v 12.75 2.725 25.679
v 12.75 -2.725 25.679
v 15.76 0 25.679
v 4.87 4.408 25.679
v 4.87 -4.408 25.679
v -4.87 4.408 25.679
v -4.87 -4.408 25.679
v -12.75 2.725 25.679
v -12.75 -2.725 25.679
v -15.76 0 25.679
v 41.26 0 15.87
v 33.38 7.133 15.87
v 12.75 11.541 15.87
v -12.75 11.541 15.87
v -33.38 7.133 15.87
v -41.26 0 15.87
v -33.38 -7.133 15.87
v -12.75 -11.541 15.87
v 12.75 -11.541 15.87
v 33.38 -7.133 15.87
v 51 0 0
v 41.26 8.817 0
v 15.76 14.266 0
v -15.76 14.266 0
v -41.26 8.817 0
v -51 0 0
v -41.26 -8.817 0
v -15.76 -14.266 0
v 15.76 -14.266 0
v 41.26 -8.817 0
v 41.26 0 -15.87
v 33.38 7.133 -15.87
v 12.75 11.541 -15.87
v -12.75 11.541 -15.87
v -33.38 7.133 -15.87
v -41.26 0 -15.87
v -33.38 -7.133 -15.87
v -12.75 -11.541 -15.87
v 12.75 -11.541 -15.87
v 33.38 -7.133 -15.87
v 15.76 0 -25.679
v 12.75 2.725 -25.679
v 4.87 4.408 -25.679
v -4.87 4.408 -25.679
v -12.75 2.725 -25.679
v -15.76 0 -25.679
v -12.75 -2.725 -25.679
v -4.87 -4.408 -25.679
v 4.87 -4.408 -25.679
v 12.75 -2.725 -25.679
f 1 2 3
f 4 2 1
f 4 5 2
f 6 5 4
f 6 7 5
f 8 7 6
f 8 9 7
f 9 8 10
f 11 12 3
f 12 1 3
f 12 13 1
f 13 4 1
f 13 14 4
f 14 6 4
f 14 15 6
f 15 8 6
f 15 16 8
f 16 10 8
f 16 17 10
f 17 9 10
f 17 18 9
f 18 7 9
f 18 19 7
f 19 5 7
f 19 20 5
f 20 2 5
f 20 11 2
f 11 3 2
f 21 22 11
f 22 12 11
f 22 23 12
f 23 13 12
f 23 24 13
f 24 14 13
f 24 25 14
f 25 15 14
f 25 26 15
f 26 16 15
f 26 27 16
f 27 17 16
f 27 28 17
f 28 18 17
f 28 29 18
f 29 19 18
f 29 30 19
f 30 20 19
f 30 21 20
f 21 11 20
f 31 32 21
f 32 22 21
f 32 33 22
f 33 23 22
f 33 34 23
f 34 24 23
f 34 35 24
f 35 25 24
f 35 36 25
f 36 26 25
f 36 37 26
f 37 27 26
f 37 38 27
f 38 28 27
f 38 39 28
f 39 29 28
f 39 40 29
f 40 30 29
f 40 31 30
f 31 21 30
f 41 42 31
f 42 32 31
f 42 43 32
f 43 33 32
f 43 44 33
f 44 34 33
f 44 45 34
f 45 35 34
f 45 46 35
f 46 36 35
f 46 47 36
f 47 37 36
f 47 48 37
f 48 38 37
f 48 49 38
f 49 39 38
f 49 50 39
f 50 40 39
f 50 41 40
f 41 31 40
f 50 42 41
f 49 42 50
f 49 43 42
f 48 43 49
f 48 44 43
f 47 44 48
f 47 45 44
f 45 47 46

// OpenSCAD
// Generated by SolidPython 1.0.1 on 2020-07-29 00:46:52


scale(v = [17, 5, 9]) {
	sphere(r = 3);
}
/***********************************************
*********      SolidPython code:      **********
************************************************
 
# import packages: SolidPython
from solid import *
from solid.utils import *
from itertools import chain, combinations, permutations


class Resize:

    def __init__(self, scad_file):
        self.scad_file = scad_file
        #self.scad_file = import_scad(scad_file)
        # cone/cylinder param:
        self.r1 = 0
        self.r2 = 0
        self.h = 0
        # rectangular prism param:
        self.w = 0
        self.l = 0
        # ellipse param:
        self.r = 0

    # import OpenScad code (file name corresponds to shape)


    # classify shape + parameters
    def assign(self, param1, param2, param3):
        if self.scad_file == 'cone.scad':
            self.r1 = param1
            self.r2 = param2
            self.h = param3
        elif self.scad_file == 'cylinder.scad':
            self.r1 = param1
            self.r2 = param2
            self.h = param3
        elif self.scad_file == 'rectangularPrism.scad':
            self.h = param1
            self.l = param2
            self.w = param3
        else:
            self.r = param1
            self.h = param2

    # resize parameters
    def iterate(self):
        x = range(3, 20, 2)
        i = 1
        if self.scad_file == 'cone.scad':
            tempList = list(permutations(x, 2))
            for temp in tempList:
                param1 = temp[0]
                param2 = temp[1]
                filepath = 'produced_scad_files/' + 'cone' + str(param1) + '_' + str(param2) + '_' + '.scad'
                scad_render_to_file(cylinder(h=param1, r1=param2, r2=0), filepath)

        elif self.scad_file == 'cylinder.scad':
            tempList = list(permutations(x, 3))
            for temp in tempList:
                param1 = temp[0]
                param2 = temp[1]
                filepath = 'produced_scad_files/' + 'cylinder' + str(param1) + '_' + str(param2) + '_' + '.scad'
                scad_render_to_file(cylinder(h=param1, r1=param2, r2=param2), filepath)

        elif self.scad_file == 'rectangularPrism.scad':
            tempList = list(permutations(x, 3))
            for temp in tempList:
                param1 = temp[0]
                param2 = temp[1]
                param3 = temp[2]
                filepath = 'produced_scad_files/' + 'rectangularPrism' + str(param1) + '_' + str(param2) + '_' + str(
                    param3) + '.scad'
                scad_render_to_file(cube(size=(param1, param2, param3)), filepath)

        elif self.scad_file == 'ellipse.scad':
            tempList = list(permutations(x, 4))
            for temp in tempList:
                param1 = temp[0]
                param2 = temp[1]
                param3 = temp[2]
                param4 = temp[3]
                filepath = 'produced_scad_files/' + 'ellipse' + str(param1) + '_' + str(param2) + '_' + str(param3) + '_' + str(param4) + '.scad'
                scad_render_to_file(scale([param1, param2, param3])(sphere(r=param4)), filepath)

    def render_to_scadfile(self):
        scad_render_to_file(scad, 'example.scad') 
 
************************************************/
